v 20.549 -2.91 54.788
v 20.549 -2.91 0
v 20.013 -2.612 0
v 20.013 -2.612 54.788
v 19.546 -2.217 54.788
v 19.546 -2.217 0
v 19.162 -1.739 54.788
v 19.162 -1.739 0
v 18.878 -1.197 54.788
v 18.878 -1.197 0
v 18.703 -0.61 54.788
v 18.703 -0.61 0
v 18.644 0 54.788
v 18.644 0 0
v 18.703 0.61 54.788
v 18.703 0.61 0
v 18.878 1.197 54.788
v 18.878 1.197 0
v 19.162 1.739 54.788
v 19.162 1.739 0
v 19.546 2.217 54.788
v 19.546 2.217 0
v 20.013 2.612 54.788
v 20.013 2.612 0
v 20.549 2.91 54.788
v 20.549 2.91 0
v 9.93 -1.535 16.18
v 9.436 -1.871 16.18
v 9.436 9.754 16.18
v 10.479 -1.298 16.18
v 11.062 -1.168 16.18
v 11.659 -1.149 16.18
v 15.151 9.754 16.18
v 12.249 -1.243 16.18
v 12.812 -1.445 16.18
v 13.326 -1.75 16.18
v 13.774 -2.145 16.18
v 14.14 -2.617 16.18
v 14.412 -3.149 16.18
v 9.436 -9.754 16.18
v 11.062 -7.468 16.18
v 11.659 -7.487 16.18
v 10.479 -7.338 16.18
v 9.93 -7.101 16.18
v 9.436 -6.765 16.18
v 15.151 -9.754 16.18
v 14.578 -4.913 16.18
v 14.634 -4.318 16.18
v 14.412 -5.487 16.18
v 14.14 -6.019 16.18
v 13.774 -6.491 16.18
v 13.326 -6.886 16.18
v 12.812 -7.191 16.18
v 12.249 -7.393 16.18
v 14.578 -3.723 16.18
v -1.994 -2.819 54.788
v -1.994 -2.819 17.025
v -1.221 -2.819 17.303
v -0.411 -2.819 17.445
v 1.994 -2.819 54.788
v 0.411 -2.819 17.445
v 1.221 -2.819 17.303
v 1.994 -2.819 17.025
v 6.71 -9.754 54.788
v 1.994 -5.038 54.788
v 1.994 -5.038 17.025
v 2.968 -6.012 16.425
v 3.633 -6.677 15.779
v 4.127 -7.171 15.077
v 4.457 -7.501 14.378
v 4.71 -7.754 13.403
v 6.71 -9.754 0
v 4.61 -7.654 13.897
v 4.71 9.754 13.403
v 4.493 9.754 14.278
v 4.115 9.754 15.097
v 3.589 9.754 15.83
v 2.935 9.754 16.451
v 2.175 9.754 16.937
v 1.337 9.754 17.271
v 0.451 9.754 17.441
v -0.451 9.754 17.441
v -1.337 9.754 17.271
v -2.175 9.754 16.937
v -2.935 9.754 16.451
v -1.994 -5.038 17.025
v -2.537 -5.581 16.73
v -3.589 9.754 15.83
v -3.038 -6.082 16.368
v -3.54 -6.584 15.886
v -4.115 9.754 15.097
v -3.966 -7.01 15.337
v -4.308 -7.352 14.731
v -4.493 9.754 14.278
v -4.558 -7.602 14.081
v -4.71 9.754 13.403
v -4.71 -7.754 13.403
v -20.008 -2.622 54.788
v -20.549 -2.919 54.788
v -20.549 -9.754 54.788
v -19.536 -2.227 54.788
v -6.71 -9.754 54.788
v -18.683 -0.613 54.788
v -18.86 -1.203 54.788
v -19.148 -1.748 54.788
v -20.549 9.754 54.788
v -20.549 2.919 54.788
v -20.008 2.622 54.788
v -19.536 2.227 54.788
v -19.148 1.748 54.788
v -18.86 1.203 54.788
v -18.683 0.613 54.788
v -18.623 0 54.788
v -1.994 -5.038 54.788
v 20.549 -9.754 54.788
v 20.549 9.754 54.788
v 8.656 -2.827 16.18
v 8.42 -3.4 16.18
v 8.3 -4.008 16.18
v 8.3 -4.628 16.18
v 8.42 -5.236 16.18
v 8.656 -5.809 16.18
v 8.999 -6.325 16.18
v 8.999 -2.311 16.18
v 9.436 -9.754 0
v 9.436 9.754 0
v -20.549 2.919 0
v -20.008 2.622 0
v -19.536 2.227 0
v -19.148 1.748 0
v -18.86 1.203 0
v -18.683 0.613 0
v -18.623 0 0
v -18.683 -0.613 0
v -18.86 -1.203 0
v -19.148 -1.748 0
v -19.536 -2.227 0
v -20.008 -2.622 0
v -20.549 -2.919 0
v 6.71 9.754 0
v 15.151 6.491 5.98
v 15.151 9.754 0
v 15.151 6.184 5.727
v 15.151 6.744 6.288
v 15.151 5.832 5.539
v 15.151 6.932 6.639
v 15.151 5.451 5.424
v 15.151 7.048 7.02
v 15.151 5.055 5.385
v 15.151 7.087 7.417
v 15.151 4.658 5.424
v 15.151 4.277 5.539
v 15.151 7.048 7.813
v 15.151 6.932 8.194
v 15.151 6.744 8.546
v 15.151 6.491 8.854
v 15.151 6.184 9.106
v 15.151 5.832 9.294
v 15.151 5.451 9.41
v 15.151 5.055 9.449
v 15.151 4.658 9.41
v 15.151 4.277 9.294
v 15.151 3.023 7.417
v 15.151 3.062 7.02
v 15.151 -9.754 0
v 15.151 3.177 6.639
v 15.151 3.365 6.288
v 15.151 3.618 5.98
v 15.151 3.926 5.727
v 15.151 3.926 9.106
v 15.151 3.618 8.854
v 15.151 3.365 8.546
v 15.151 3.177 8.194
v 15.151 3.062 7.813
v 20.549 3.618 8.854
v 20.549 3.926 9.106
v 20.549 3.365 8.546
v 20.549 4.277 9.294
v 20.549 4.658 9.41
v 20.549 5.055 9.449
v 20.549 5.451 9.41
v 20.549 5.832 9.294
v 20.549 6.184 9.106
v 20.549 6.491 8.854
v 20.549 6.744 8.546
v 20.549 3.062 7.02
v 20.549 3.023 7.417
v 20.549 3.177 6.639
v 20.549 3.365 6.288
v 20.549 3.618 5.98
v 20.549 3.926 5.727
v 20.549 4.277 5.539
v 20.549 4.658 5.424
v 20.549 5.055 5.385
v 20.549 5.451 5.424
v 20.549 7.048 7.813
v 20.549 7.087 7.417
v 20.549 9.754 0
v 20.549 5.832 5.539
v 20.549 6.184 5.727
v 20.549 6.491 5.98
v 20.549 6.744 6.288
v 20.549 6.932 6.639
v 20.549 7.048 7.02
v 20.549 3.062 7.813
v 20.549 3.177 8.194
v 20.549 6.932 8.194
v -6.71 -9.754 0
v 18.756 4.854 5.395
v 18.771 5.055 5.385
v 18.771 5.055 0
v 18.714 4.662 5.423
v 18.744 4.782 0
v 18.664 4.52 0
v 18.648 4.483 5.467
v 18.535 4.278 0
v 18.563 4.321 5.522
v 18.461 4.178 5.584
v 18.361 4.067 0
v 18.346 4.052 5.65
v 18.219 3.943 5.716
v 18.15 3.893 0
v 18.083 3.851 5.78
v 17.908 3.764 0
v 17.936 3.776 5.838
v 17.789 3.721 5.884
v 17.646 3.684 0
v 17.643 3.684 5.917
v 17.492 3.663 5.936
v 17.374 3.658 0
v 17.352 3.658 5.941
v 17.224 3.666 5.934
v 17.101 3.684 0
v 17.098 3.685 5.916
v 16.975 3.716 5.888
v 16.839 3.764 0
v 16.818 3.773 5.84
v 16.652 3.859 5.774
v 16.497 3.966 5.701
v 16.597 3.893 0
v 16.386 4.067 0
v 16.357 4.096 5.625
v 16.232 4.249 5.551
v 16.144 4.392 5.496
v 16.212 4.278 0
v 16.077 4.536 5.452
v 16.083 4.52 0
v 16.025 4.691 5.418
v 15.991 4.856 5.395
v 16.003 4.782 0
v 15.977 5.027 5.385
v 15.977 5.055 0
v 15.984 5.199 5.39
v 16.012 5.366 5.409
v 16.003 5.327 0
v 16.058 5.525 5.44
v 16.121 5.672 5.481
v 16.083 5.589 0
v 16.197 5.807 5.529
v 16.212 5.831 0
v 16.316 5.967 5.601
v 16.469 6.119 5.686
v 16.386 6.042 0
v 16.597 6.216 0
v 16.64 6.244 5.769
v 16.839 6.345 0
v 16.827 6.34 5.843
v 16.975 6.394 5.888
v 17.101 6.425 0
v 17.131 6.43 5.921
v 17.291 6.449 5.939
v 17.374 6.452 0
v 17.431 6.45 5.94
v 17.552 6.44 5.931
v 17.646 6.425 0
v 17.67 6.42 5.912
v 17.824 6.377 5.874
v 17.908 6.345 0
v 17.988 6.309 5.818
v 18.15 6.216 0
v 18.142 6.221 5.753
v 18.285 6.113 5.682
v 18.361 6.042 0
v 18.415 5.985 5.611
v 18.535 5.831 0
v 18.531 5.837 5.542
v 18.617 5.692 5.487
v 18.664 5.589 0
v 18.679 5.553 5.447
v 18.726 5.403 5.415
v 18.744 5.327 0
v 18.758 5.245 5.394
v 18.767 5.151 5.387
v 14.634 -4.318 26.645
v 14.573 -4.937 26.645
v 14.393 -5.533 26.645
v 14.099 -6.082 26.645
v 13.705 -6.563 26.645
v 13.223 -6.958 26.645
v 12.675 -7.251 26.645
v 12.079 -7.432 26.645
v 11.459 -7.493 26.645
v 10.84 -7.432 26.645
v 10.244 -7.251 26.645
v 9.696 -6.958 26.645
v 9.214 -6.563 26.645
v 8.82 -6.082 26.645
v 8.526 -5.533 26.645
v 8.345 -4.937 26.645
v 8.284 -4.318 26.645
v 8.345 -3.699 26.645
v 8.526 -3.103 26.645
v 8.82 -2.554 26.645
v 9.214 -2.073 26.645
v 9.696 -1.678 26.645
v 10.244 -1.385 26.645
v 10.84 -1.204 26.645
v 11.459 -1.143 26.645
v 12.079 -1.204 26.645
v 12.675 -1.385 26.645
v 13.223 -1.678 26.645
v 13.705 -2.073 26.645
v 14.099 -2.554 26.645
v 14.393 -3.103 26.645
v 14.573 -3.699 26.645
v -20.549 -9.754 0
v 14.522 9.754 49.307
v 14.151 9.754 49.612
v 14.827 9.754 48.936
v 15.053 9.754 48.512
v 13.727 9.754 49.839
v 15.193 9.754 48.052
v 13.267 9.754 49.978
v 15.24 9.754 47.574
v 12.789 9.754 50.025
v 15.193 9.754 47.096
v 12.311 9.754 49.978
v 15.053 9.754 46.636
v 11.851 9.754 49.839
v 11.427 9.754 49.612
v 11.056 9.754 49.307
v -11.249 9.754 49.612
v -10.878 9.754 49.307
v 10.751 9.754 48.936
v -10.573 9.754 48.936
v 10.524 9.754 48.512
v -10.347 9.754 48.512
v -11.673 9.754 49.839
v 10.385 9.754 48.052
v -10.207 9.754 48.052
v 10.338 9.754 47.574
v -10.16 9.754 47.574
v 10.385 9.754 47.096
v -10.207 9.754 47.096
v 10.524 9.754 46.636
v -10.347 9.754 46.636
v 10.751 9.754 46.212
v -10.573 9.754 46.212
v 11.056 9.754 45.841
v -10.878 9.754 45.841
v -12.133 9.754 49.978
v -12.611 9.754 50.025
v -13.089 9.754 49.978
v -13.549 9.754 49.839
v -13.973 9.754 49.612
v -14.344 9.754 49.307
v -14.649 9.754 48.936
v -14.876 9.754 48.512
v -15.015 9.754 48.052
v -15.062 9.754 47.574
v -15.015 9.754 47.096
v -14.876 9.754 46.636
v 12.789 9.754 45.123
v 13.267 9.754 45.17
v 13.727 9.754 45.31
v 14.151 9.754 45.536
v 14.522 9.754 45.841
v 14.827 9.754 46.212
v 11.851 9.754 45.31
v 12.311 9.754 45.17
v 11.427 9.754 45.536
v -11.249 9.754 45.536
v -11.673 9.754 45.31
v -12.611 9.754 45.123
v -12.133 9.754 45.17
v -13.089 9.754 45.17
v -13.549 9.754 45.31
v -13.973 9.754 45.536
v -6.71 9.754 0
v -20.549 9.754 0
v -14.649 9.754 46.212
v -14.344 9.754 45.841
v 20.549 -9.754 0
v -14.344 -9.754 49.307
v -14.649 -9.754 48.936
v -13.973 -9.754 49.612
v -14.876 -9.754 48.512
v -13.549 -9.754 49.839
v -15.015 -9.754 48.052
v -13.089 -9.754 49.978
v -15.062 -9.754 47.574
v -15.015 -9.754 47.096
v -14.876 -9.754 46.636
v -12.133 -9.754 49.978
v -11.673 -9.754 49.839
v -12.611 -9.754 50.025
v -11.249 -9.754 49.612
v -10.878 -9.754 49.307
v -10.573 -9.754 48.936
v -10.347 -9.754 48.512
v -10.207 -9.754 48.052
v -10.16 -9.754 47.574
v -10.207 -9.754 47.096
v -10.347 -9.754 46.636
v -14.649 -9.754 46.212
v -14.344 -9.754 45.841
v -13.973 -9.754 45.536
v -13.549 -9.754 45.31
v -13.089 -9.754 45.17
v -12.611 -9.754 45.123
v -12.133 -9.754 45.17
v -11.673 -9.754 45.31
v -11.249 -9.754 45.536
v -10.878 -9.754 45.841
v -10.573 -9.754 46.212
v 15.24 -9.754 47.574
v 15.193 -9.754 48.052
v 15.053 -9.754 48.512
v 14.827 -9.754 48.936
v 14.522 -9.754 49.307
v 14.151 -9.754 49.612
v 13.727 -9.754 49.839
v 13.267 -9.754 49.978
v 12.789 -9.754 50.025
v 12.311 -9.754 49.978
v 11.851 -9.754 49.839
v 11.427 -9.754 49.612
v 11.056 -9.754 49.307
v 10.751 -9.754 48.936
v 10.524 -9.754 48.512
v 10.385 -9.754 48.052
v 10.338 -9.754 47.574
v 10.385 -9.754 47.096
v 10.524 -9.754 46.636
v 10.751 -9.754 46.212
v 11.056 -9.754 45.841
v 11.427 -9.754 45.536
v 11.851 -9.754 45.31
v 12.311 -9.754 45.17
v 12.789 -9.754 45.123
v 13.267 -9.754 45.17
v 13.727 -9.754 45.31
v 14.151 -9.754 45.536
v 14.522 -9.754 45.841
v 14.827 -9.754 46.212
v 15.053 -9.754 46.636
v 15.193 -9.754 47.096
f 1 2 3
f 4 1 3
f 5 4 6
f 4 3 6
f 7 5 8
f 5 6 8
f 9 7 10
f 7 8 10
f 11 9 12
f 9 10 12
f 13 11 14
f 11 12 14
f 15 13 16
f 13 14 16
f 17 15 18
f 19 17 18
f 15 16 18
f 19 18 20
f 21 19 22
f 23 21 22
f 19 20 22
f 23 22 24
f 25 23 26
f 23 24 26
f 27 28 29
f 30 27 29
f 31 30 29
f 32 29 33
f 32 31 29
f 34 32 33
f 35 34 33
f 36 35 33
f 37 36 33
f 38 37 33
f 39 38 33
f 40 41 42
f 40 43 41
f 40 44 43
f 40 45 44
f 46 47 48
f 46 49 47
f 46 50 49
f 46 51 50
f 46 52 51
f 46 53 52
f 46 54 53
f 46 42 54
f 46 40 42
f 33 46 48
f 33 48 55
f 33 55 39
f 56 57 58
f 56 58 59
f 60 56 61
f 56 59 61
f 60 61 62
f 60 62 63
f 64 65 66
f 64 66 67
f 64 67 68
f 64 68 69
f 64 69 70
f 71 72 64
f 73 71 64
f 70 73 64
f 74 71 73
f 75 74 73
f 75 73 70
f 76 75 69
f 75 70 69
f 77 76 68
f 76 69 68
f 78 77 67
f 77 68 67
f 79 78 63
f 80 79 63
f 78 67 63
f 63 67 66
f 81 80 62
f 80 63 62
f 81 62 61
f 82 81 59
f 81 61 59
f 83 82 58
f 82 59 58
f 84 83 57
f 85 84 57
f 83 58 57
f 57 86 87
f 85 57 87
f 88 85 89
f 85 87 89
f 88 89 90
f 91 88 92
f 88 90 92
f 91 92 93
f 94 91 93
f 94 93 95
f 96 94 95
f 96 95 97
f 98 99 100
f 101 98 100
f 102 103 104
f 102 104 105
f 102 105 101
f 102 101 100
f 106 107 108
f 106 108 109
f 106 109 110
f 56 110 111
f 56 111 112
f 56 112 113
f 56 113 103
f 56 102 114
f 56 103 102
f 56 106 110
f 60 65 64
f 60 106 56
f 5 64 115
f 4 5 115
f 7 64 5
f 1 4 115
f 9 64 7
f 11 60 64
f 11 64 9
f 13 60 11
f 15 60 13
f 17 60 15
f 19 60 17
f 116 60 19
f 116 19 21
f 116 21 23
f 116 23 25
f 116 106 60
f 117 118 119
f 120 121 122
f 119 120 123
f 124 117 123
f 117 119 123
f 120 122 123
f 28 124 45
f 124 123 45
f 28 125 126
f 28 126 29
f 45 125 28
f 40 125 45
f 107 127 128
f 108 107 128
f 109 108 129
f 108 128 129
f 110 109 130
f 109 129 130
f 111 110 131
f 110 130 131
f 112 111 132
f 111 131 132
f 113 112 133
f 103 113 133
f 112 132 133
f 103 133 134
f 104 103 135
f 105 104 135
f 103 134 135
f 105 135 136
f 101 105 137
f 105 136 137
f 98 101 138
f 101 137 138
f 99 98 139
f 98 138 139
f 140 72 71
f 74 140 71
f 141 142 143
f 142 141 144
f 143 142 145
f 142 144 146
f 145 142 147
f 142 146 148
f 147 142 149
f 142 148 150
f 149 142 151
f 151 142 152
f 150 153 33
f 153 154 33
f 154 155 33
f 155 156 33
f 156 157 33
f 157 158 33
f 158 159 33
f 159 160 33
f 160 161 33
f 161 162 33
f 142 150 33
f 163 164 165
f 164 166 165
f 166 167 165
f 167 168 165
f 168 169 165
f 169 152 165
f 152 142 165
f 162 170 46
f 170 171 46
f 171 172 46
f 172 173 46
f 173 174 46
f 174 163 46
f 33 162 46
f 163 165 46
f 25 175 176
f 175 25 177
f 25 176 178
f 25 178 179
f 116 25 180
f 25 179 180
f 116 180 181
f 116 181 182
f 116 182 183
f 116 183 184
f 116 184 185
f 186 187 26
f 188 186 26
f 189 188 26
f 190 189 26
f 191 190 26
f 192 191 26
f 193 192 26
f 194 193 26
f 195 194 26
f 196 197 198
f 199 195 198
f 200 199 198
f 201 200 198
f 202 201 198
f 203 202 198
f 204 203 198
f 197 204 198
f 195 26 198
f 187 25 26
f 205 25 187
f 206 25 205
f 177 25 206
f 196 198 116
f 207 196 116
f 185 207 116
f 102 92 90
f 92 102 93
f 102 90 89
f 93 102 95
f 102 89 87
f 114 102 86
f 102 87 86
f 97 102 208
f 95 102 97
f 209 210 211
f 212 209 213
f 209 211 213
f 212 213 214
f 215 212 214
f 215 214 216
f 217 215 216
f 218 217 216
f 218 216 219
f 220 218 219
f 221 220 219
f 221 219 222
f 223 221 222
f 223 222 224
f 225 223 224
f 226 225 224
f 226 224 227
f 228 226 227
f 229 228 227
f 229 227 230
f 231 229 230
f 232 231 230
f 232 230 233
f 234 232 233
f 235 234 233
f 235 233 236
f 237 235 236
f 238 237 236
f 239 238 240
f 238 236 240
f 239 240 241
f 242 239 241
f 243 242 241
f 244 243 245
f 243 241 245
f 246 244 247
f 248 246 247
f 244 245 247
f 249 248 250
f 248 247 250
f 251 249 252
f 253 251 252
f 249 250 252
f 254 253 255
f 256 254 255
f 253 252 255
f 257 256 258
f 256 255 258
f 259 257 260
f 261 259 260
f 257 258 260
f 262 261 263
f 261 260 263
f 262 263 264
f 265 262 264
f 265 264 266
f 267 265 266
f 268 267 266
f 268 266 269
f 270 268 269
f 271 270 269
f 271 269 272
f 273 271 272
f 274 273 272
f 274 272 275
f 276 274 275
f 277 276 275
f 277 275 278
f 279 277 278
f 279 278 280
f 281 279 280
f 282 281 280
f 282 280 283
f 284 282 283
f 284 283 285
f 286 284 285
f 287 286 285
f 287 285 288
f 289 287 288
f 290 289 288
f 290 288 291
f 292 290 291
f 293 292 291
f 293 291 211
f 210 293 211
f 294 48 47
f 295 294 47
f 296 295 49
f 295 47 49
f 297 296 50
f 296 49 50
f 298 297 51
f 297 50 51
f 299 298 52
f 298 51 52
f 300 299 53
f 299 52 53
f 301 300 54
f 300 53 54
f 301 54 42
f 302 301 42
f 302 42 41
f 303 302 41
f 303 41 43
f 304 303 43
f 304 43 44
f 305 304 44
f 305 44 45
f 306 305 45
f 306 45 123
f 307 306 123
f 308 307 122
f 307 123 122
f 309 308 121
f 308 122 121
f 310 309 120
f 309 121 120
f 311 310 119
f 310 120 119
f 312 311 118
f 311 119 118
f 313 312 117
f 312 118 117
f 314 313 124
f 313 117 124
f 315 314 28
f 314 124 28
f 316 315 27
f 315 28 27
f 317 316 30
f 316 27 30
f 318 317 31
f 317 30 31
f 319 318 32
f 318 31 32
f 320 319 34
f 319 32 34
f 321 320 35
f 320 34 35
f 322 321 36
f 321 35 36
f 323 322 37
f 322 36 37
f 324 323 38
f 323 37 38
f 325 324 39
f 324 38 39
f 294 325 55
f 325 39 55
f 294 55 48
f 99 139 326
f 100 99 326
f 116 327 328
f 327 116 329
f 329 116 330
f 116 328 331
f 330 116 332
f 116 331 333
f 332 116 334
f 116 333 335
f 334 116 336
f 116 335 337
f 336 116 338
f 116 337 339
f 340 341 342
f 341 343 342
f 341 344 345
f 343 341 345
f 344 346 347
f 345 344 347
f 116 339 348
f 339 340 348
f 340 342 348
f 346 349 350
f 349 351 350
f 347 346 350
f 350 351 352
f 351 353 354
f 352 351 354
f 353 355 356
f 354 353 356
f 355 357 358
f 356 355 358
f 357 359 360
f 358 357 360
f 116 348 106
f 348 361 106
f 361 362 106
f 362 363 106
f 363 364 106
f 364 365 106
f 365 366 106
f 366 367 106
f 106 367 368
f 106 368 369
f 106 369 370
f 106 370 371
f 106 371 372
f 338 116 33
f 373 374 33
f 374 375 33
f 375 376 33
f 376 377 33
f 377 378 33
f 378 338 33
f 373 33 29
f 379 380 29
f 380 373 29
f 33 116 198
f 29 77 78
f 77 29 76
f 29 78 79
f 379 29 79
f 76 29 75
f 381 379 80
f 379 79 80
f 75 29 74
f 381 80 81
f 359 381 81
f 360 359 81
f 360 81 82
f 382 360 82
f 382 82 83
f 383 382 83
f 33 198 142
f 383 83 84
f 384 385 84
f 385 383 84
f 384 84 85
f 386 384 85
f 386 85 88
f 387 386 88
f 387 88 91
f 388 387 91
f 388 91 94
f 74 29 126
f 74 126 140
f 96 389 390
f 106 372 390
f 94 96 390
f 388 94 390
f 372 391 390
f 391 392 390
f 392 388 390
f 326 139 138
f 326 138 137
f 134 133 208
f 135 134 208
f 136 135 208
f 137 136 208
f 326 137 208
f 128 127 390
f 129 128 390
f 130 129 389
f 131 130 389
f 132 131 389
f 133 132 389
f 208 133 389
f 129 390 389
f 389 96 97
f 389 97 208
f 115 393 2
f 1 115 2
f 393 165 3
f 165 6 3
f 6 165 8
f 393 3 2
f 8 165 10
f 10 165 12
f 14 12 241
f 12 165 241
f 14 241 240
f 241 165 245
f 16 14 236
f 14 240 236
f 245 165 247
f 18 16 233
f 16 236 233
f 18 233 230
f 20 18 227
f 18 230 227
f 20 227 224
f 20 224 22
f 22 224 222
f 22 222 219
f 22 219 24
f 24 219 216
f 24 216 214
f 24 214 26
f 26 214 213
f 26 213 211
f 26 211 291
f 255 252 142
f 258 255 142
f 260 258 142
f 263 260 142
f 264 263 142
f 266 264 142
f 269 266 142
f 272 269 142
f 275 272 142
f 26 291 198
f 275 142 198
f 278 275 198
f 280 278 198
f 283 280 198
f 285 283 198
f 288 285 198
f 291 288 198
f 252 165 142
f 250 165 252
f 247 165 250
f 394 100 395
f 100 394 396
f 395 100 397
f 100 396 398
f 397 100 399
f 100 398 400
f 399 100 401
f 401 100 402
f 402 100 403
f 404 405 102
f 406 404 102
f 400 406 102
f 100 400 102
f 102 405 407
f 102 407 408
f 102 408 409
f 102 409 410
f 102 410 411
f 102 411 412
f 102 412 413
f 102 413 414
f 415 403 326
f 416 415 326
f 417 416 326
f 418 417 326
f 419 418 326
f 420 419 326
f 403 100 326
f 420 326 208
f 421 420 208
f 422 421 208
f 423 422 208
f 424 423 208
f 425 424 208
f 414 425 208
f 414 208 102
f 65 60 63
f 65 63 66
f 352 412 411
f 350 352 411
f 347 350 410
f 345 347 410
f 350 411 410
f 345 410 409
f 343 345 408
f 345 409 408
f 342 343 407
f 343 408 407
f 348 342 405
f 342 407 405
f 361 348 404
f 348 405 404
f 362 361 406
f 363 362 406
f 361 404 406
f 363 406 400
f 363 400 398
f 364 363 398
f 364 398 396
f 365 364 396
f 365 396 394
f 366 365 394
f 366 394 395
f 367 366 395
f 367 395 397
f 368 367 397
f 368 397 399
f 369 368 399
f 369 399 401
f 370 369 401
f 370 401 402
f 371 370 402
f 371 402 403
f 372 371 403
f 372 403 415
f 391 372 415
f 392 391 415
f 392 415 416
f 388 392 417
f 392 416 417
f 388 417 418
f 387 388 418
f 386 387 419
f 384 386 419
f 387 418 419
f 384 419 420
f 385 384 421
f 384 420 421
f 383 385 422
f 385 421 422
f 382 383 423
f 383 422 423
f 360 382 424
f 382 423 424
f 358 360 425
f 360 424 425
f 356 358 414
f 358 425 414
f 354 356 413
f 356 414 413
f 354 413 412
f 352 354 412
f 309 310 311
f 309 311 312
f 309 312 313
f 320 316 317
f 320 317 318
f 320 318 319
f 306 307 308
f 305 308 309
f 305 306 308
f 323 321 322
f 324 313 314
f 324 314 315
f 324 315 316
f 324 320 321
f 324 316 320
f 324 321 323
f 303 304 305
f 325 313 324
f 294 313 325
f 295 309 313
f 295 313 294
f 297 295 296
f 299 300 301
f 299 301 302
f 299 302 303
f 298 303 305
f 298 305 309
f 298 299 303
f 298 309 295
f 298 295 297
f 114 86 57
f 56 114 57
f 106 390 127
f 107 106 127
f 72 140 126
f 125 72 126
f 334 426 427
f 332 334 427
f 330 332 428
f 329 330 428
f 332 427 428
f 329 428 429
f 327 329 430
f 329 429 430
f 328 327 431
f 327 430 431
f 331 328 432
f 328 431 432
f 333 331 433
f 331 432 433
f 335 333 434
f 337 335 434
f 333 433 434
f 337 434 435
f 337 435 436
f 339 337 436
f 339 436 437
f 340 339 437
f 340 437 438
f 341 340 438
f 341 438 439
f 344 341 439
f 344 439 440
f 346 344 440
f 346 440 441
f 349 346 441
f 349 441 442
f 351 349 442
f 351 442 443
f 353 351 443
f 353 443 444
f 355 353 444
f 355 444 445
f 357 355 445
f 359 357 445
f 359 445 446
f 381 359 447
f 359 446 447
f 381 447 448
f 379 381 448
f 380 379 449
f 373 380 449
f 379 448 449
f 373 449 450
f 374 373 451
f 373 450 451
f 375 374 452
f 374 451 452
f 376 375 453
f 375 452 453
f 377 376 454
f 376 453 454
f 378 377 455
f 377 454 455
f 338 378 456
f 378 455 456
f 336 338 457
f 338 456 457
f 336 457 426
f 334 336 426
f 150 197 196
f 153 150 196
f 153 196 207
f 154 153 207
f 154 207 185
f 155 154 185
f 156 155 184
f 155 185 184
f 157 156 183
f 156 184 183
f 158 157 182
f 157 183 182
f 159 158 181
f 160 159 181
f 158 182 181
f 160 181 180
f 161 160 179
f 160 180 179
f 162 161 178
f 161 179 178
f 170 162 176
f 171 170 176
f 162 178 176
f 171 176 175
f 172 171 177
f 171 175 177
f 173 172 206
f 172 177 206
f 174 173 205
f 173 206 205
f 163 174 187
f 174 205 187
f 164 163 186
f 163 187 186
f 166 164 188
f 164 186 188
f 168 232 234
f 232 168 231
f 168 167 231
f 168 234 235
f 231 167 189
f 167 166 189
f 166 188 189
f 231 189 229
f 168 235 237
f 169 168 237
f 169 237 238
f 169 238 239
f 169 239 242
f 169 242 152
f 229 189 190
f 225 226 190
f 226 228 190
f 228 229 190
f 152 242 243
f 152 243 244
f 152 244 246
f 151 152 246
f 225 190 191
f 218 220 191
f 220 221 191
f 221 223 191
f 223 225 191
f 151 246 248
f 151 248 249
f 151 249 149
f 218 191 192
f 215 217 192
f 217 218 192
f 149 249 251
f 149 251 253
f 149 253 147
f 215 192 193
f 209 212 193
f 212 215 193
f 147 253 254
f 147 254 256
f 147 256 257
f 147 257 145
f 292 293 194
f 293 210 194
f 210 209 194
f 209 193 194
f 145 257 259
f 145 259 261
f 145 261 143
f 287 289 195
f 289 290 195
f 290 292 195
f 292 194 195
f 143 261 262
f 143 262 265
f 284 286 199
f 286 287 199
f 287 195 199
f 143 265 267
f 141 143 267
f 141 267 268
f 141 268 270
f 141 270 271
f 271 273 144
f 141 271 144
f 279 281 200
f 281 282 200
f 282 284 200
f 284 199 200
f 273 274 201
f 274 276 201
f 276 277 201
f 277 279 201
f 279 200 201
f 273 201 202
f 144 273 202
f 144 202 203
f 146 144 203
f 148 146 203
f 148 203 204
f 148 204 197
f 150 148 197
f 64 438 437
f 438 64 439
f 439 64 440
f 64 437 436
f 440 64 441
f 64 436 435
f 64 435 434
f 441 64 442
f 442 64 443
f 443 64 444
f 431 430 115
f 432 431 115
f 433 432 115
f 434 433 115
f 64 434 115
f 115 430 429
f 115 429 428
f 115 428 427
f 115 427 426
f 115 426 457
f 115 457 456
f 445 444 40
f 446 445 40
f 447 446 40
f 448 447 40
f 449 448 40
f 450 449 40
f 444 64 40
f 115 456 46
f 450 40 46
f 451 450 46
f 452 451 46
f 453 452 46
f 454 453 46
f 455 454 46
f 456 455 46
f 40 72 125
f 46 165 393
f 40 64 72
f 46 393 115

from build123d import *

# Parameters (mm, degrees)
F1_DEPTH = 54.7878
F2_R     = 2.4511
F2_W     = 5.715
F2_H     = 16.1798
F3_DEPTH = 25.4
F4_R     = 3.175
F5_DEPTH = 10.4648
F6_R     = 2.032
F7_DEPTH = 5.3975
F8_R     = 1.397
F9_DEPTH = 5.9421934451


with BuildPart() as f1:
    # F0 (on Top) → F1 (new body)
    with BuildSketch(Plane.XY):
        with BuildLine():
            Line((20.5486, 2.9099355663), (20.5486, 9.7536))
            Line((20.5486, 9.7536), (-20.5486, 9.7536))
            Line((-20.5486, 9.7536), (-20.5486, 2.918719736))
            ThreePointArc((-20.5486, 2.918719736), (-18.62328, 0), (-20.5486, -2.918719736))
            Line((-20.5486, -2.918719736), (-20.5486, -9.7536))
            Line((-20.5486, -9.7536), (-6.7096824712, -9.7536))
            Line((-6.7096824712, -9.7536), (-1.9939, -5.0378175288))
            Line((-1.9939, -5.0378175288), (-1.9939, -2.8194))
            Line((-1.9939, -2.8194), (1.9939, -2.8194))
            Line((1.9939, -2.8194), (1.9939, -5.0378175288))
            Line((1.9939, -5.0378175288), (6.7096824712, -9.7536))
            Line((6.7096824712, -9.7536), (20.5486, -9.7536))
            Line((20.5486, -9.7536), (20.5486, -2.9099355663))
            ThreePointArc((20.5486, -2.9099355663), (18.6436, 0), (20.5486, 2.9099355663))
        make_face()
    extrude(amount=F1_DEPTH)

    # F2 (on face) → F3 (cut)
    with BuildSketch(Plane.XZ.offset(9.7536)):
        with Locations((-12.6111, 47.5742)):
            Circle(F2_R)
        with Locations((12.7889, 47.5742)):
            Circle(F2_R)
        with Locations((12.2936, 8.0899)):
            Rectangle(F2_W, F2_H)
        with BuildLine():
            Line((6.7096824712, 0), (4.710379922, 13.4026572713))
            ThreePointArc((4.710379922, 13.4026572713), (0, 17.4625), (-4.710379922, 13.4026572713))
            Line((-4.710379922, 13.4026572713), (-6.7096824712, 0))
            Line((-6.7096824712, 0), (6.7096824712, 0))
        make_face()
    extrude(amount=-F3_DEPTH, mode=Mode.SUBTRACT)

    # F4 (on face) → F5 (cut)
    with BuildSketch(Plane(origin=(0, 0, 16.1798), x_dir=(1, 0, 0), z_dir=(0, 0, -1))):
        with Locations((11.4594824712, 4.318)):
            Circle(F4_R)
    extrude(amount=-F5_DEPTH, mode=Mode.SUBTRACT)

    # F6 (on face) → F7 (cut, through all)
    with BuildSketch(Plane.YZ.offset(20.5486)):
        with Locations((5.0546, 7.4168)):
            Circle(F6_R)
    extrude(amount=-F7_DEPTH, mode=Mode.SUBTRACT)

    # F8 (on face) → F9 (cut, through all)
    with BuildSketch(Plane(origin=(0, 0, 0), x_dir=(1, 0, 0), z_dir=(0, 0, -1))):
        with Locations((17.3736, -5.0546)):
            Circle(F8_R)
    extrude(amount=-F9_DEPTH, mode=Mode.SUBTRACT)


solid = f1.part
